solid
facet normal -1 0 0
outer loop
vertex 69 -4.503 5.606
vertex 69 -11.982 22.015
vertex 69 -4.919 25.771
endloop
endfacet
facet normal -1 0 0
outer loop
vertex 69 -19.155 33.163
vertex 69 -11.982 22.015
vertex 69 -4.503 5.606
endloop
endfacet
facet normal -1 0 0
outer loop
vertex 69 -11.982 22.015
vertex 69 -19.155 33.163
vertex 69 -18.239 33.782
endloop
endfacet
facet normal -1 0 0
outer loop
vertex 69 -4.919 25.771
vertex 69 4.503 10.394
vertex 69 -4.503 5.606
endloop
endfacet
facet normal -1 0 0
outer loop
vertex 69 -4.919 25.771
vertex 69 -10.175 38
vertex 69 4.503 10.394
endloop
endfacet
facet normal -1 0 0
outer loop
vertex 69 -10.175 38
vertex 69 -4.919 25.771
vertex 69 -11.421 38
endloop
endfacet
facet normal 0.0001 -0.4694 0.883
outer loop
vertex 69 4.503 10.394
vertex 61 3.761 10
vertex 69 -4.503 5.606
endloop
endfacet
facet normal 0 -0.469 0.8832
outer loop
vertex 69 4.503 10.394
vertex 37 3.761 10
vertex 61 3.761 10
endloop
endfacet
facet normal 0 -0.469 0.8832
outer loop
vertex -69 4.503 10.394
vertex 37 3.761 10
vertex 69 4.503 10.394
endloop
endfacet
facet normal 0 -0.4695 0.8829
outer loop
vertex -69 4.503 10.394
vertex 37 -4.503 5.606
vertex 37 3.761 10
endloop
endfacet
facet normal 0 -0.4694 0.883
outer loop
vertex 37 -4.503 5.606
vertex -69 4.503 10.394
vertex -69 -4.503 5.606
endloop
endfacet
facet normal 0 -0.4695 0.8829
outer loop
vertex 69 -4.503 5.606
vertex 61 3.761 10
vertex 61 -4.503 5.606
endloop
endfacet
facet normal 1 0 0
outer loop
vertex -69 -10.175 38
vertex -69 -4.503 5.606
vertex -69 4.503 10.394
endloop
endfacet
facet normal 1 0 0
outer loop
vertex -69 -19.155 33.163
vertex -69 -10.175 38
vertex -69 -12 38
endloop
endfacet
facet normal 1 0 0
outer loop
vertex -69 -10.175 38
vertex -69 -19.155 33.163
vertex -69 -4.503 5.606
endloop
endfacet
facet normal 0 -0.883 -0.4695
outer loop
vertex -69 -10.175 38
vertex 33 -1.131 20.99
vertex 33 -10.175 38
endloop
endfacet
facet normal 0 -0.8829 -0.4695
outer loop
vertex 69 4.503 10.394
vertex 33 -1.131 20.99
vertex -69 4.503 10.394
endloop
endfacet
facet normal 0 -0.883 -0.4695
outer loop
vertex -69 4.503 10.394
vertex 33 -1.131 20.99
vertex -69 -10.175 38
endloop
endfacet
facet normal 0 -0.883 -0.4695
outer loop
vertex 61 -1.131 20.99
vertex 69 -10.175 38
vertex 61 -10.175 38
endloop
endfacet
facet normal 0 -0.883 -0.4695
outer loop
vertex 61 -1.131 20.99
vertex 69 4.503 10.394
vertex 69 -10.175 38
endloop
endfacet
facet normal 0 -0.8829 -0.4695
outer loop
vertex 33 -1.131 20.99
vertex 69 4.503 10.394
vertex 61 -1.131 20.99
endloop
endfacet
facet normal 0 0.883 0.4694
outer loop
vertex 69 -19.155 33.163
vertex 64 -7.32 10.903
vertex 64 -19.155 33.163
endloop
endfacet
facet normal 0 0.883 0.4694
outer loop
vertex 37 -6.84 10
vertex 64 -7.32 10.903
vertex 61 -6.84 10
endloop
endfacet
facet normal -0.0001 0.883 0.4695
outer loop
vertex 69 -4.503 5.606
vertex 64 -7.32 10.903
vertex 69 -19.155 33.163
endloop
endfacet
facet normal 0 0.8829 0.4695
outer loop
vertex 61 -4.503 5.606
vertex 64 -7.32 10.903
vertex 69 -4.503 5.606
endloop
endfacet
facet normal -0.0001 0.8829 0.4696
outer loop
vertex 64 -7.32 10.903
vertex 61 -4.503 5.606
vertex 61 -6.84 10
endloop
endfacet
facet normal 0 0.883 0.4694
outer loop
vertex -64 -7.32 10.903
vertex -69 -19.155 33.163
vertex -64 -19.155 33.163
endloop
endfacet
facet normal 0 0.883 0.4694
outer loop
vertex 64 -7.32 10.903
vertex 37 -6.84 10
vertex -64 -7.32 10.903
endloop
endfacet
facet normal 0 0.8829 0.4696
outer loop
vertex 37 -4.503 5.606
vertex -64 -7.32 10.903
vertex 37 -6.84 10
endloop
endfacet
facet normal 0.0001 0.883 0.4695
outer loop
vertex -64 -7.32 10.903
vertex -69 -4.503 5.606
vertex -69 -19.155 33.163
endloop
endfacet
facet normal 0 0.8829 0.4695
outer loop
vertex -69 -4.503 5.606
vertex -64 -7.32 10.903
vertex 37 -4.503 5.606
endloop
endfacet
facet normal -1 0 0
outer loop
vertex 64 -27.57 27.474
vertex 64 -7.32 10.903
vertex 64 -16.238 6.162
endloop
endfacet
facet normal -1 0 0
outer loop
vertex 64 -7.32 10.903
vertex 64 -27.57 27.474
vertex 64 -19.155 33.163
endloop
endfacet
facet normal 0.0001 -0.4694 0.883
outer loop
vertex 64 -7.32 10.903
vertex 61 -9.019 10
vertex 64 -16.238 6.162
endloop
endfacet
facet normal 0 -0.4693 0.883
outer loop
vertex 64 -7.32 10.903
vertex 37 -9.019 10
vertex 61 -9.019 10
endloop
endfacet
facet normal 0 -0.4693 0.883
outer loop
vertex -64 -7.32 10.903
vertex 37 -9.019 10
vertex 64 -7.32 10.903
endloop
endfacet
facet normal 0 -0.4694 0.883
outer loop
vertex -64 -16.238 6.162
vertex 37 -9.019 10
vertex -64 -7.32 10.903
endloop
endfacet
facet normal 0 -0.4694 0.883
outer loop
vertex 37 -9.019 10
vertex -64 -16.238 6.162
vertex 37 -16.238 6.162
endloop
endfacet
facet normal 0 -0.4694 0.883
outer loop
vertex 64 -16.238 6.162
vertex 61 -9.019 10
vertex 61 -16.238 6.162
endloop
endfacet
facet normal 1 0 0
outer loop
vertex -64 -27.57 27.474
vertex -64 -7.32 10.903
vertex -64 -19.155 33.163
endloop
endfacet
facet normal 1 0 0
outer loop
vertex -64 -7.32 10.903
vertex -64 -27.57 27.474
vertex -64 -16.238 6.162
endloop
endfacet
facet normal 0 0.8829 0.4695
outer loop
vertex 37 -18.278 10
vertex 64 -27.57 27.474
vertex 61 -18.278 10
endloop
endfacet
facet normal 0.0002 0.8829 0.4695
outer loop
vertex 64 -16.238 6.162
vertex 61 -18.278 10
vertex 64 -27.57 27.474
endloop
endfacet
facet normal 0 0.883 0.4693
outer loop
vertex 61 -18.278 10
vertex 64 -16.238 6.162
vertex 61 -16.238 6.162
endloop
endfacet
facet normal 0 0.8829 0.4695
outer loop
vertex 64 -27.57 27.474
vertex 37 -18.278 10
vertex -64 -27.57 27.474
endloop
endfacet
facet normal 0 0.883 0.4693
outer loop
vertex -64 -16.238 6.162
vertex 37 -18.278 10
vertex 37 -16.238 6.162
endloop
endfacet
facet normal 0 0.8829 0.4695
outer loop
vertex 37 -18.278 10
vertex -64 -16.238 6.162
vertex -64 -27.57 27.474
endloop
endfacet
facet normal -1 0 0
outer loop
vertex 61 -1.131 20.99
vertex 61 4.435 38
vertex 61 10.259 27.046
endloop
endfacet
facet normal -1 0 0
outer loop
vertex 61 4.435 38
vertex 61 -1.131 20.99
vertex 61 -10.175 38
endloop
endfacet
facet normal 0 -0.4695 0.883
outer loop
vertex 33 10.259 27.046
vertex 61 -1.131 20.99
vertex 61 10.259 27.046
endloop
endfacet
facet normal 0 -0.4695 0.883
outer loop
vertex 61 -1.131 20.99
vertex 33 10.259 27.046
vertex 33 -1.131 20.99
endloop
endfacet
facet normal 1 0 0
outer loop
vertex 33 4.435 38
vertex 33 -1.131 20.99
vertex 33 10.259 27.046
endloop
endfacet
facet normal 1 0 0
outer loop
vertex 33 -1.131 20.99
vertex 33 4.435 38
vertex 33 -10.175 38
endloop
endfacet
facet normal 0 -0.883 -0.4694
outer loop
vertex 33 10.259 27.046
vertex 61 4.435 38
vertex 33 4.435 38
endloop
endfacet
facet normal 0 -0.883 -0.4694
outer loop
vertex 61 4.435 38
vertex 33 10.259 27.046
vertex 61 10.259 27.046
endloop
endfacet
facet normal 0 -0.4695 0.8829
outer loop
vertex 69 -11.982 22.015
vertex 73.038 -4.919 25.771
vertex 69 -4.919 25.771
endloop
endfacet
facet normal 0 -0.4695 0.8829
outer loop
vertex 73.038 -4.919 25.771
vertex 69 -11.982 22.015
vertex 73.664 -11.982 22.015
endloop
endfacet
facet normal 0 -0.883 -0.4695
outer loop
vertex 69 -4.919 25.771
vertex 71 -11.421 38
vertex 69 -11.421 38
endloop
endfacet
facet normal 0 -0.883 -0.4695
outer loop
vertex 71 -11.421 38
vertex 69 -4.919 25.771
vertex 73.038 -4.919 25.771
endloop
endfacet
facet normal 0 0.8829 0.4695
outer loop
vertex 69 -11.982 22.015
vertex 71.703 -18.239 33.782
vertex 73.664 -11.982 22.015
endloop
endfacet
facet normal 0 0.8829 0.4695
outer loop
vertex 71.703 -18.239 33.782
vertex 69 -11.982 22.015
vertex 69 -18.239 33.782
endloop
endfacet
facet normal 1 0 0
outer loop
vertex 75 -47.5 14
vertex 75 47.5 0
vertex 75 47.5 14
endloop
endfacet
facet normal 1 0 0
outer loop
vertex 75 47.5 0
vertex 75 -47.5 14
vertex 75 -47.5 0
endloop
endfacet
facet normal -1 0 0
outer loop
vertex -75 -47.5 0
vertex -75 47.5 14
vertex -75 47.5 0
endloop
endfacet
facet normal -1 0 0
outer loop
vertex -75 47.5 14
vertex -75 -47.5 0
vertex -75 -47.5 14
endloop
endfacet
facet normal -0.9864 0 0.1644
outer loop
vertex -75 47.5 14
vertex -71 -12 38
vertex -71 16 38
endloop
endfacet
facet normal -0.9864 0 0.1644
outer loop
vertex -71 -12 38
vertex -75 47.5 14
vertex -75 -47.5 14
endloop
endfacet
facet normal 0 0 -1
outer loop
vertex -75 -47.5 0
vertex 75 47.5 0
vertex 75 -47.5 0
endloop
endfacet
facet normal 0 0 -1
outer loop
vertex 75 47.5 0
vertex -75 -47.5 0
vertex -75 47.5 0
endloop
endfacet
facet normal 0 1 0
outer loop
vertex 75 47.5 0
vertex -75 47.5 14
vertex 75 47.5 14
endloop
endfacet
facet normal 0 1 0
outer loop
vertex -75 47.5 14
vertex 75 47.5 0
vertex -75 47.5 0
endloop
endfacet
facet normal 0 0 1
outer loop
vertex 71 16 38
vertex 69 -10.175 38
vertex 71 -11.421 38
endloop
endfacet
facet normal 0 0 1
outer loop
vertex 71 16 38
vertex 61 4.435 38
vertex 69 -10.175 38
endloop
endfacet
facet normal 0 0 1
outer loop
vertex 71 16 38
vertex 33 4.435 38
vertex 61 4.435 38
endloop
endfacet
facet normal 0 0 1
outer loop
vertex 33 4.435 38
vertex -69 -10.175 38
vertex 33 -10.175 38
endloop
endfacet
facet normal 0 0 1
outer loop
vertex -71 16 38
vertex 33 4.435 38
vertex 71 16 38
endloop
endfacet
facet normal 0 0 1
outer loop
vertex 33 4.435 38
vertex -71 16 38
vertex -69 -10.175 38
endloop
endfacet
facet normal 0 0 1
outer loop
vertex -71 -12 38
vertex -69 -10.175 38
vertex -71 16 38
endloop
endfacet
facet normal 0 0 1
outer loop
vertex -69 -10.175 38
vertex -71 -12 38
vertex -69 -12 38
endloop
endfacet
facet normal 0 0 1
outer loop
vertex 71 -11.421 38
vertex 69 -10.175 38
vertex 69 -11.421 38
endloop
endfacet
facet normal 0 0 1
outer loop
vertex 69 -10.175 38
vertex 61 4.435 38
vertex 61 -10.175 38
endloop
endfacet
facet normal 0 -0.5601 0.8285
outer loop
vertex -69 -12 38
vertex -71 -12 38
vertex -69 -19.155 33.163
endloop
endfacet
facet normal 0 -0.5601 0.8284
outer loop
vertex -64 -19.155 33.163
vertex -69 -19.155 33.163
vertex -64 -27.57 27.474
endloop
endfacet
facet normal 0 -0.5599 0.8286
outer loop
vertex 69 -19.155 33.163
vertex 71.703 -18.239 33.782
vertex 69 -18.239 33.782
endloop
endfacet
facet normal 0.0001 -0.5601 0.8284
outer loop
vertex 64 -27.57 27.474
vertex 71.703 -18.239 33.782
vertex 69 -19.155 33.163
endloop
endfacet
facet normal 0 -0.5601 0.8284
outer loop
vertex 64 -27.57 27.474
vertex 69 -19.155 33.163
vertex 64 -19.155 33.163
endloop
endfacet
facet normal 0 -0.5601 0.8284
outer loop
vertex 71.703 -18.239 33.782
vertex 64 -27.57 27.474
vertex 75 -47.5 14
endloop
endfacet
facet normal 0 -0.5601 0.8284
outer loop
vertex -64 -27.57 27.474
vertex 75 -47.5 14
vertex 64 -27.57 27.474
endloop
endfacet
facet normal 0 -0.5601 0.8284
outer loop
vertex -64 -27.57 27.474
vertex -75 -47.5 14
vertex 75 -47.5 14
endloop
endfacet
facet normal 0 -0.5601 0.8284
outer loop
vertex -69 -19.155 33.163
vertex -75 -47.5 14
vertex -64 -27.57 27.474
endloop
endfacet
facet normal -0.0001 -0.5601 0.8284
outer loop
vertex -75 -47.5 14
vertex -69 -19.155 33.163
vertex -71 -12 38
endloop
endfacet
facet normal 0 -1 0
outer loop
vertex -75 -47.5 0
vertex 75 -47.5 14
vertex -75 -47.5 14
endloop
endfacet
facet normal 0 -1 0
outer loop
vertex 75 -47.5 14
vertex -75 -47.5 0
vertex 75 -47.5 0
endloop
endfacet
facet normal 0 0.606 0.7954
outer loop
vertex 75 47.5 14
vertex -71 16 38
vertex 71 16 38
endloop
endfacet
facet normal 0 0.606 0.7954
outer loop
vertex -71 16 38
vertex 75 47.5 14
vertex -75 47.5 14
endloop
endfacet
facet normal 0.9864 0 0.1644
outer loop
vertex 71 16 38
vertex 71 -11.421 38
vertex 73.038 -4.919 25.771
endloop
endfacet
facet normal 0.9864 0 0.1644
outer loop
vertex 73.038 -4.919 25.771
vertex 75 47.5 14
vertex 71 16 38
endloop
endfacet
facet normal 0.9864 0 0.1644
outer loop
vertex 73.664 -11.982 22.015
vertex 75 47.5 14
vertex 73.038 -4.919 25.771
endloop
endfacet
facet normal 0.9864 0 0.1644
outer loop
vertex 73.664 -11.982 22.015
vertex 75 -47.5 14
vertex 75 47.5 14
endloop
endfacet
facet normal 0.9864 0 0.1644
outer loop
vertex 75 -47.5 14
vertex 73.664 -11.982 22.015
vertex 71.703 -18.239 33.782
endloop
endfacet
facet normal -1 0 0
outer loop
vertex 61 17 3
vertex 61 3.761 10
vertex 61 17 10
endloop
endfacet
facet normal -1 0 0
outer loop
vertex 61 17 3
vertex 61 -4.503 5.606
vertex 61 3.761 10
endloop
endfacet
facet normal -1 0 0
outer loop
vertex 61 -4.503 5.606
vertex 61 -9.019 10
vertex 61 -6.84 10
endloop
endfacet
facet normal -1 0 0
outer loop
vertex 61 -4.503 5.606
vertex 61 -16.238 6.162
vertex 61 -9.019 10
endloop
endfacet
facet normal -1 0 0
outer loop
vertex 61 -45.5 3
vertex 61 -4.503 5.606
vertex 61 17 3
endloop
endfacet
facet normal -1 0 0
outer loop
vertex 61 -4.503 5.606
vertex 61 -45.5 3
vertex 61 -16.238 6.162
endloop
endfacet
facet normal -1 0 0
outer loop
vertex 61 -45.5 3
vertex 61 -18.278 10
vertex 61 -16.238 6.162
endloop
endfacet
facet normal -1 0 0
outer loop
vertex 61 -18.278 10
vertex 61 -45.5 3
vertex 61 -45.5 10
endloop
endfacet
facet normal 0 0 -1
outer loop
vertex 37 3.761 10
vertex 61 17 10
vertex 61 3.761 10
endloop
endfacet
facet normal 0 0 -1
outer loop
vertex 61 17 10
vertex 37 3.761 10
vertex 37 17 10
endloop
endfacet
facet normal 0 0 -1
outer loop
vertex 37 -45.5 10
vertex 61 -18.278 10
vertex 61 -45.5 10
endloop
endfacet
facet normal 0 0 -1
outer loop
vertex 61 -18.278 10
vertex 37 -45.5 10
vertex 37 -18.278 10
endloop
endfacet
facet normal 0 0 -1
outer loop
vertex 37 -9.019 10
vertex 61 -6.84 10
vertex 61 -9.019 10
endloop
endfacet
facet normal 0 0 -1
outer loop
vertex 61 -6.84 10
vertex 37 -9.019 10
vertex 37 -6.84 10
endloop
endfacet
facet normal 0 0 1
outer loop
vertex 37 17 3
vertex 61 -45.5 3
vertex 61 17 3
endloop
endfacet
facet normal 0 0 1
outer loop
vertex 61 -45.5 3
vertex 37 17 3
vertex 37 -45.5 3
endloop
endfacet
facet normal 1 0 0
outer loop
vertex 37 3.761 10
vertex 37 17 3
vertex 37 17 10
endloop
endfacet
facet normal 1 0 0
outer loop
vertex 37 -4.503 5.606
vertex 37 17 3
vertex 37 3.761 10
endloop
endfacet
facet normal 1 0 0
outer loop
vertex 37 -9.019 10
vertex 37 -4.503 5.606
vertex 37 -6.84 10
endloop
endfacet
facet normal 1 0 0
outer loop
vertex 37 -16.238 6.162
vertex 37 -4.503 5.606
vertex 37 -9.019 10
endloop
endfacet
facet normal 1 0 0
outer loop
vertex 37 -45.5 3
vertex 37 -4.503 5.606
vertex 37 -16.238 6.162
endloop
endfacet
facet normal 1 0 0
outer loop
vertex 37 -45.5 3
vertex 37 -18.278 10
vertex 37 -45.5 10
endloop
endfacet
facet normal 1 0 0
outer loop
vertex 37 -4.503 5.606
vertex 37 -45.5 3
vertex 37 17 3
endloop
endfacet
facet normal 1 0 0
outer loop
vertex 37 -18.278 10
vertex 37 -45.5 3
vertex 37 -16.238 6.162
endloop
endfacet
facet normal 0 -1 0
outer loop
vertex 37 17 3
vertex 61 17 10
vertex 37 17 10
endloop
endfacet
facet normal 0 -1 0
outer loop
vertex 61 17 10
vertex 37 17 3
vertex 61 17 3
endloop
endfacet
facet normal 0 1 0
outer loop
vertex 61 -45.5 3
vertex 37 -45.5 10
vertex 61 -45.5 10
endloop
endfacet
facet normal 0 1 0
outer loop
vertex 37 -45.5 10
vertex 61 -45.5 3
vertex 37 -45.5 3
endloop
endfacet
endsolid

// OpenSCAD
// Parametric 3D Printable Desk Stand for Samsung Galaxy S3 Neo (GT-I9301I)
// Dimensions: 136.6 x 70.7 x 8.6 mm (with clearance tolerances)
// Features: 62-degree viewing angle, front-redirected rear speaker horn, micro-USB cable channel

$fn = 64;

phone_w = 138.0; // Landscape width (136.6mm + tolerance)
phone_h = 72.0;  // Landscape height (70.7mm + tolerance)
phone_d = 10.2;  // Thickness (8.6mm + tolerance)
tilt_angle = 28; // 90 - 62 deg viewing angle

base_w = 150;
base_d = 95;
base_h = 14;

module s3neo_cutout() {
    translate([0, 0, 8])
    rotate([tilt_angle, 0, 0]) {
        // Main phone body slot
        translate([-phone_w/2, -phone_d/2, 0])
            cube([phone_w, phone_d, phone_h]);
        
        // Front screen viewport cutout
        translate([-(phone_w-10)/2, -phone_d - 5, 6])
            cube([phone_w-10, phone_d + 6, phone_h]);
            
        // Rear camera & speaker acoustic intake cavity
        translate([phone_w/2 - 36, 0, 12])
            cube([28, 18, 30]);
            
        // Right-side Micro-USB charging cable channel
        translate([phone_w/2 - 2, -4, 18])
            cube([20, 8, 16]);
    }
}

module acoustic_horn() {
    // Channels rear speaker audio from the back of the S3 Neo out the front base
    translate([phone_w/2 - 32, -base_d/2 + 2, 3])
        cube([24, base_d/2 + 15, 7]);
}

difference() {
    // Outer stand body
    hull() {
        translate([-base_w/2, -base_d/2, 0])
            cube([base_w, base_d, base_h]);
        translate([-base_w/2 + 4, -12, 0])
            cube([base_w - 8, 28, 38]);
    }
    
    // Subtract phone cradle, acoustic horn, and bottom mic clearance
    s3neo_cutout();
    acoustic_horn();
}
